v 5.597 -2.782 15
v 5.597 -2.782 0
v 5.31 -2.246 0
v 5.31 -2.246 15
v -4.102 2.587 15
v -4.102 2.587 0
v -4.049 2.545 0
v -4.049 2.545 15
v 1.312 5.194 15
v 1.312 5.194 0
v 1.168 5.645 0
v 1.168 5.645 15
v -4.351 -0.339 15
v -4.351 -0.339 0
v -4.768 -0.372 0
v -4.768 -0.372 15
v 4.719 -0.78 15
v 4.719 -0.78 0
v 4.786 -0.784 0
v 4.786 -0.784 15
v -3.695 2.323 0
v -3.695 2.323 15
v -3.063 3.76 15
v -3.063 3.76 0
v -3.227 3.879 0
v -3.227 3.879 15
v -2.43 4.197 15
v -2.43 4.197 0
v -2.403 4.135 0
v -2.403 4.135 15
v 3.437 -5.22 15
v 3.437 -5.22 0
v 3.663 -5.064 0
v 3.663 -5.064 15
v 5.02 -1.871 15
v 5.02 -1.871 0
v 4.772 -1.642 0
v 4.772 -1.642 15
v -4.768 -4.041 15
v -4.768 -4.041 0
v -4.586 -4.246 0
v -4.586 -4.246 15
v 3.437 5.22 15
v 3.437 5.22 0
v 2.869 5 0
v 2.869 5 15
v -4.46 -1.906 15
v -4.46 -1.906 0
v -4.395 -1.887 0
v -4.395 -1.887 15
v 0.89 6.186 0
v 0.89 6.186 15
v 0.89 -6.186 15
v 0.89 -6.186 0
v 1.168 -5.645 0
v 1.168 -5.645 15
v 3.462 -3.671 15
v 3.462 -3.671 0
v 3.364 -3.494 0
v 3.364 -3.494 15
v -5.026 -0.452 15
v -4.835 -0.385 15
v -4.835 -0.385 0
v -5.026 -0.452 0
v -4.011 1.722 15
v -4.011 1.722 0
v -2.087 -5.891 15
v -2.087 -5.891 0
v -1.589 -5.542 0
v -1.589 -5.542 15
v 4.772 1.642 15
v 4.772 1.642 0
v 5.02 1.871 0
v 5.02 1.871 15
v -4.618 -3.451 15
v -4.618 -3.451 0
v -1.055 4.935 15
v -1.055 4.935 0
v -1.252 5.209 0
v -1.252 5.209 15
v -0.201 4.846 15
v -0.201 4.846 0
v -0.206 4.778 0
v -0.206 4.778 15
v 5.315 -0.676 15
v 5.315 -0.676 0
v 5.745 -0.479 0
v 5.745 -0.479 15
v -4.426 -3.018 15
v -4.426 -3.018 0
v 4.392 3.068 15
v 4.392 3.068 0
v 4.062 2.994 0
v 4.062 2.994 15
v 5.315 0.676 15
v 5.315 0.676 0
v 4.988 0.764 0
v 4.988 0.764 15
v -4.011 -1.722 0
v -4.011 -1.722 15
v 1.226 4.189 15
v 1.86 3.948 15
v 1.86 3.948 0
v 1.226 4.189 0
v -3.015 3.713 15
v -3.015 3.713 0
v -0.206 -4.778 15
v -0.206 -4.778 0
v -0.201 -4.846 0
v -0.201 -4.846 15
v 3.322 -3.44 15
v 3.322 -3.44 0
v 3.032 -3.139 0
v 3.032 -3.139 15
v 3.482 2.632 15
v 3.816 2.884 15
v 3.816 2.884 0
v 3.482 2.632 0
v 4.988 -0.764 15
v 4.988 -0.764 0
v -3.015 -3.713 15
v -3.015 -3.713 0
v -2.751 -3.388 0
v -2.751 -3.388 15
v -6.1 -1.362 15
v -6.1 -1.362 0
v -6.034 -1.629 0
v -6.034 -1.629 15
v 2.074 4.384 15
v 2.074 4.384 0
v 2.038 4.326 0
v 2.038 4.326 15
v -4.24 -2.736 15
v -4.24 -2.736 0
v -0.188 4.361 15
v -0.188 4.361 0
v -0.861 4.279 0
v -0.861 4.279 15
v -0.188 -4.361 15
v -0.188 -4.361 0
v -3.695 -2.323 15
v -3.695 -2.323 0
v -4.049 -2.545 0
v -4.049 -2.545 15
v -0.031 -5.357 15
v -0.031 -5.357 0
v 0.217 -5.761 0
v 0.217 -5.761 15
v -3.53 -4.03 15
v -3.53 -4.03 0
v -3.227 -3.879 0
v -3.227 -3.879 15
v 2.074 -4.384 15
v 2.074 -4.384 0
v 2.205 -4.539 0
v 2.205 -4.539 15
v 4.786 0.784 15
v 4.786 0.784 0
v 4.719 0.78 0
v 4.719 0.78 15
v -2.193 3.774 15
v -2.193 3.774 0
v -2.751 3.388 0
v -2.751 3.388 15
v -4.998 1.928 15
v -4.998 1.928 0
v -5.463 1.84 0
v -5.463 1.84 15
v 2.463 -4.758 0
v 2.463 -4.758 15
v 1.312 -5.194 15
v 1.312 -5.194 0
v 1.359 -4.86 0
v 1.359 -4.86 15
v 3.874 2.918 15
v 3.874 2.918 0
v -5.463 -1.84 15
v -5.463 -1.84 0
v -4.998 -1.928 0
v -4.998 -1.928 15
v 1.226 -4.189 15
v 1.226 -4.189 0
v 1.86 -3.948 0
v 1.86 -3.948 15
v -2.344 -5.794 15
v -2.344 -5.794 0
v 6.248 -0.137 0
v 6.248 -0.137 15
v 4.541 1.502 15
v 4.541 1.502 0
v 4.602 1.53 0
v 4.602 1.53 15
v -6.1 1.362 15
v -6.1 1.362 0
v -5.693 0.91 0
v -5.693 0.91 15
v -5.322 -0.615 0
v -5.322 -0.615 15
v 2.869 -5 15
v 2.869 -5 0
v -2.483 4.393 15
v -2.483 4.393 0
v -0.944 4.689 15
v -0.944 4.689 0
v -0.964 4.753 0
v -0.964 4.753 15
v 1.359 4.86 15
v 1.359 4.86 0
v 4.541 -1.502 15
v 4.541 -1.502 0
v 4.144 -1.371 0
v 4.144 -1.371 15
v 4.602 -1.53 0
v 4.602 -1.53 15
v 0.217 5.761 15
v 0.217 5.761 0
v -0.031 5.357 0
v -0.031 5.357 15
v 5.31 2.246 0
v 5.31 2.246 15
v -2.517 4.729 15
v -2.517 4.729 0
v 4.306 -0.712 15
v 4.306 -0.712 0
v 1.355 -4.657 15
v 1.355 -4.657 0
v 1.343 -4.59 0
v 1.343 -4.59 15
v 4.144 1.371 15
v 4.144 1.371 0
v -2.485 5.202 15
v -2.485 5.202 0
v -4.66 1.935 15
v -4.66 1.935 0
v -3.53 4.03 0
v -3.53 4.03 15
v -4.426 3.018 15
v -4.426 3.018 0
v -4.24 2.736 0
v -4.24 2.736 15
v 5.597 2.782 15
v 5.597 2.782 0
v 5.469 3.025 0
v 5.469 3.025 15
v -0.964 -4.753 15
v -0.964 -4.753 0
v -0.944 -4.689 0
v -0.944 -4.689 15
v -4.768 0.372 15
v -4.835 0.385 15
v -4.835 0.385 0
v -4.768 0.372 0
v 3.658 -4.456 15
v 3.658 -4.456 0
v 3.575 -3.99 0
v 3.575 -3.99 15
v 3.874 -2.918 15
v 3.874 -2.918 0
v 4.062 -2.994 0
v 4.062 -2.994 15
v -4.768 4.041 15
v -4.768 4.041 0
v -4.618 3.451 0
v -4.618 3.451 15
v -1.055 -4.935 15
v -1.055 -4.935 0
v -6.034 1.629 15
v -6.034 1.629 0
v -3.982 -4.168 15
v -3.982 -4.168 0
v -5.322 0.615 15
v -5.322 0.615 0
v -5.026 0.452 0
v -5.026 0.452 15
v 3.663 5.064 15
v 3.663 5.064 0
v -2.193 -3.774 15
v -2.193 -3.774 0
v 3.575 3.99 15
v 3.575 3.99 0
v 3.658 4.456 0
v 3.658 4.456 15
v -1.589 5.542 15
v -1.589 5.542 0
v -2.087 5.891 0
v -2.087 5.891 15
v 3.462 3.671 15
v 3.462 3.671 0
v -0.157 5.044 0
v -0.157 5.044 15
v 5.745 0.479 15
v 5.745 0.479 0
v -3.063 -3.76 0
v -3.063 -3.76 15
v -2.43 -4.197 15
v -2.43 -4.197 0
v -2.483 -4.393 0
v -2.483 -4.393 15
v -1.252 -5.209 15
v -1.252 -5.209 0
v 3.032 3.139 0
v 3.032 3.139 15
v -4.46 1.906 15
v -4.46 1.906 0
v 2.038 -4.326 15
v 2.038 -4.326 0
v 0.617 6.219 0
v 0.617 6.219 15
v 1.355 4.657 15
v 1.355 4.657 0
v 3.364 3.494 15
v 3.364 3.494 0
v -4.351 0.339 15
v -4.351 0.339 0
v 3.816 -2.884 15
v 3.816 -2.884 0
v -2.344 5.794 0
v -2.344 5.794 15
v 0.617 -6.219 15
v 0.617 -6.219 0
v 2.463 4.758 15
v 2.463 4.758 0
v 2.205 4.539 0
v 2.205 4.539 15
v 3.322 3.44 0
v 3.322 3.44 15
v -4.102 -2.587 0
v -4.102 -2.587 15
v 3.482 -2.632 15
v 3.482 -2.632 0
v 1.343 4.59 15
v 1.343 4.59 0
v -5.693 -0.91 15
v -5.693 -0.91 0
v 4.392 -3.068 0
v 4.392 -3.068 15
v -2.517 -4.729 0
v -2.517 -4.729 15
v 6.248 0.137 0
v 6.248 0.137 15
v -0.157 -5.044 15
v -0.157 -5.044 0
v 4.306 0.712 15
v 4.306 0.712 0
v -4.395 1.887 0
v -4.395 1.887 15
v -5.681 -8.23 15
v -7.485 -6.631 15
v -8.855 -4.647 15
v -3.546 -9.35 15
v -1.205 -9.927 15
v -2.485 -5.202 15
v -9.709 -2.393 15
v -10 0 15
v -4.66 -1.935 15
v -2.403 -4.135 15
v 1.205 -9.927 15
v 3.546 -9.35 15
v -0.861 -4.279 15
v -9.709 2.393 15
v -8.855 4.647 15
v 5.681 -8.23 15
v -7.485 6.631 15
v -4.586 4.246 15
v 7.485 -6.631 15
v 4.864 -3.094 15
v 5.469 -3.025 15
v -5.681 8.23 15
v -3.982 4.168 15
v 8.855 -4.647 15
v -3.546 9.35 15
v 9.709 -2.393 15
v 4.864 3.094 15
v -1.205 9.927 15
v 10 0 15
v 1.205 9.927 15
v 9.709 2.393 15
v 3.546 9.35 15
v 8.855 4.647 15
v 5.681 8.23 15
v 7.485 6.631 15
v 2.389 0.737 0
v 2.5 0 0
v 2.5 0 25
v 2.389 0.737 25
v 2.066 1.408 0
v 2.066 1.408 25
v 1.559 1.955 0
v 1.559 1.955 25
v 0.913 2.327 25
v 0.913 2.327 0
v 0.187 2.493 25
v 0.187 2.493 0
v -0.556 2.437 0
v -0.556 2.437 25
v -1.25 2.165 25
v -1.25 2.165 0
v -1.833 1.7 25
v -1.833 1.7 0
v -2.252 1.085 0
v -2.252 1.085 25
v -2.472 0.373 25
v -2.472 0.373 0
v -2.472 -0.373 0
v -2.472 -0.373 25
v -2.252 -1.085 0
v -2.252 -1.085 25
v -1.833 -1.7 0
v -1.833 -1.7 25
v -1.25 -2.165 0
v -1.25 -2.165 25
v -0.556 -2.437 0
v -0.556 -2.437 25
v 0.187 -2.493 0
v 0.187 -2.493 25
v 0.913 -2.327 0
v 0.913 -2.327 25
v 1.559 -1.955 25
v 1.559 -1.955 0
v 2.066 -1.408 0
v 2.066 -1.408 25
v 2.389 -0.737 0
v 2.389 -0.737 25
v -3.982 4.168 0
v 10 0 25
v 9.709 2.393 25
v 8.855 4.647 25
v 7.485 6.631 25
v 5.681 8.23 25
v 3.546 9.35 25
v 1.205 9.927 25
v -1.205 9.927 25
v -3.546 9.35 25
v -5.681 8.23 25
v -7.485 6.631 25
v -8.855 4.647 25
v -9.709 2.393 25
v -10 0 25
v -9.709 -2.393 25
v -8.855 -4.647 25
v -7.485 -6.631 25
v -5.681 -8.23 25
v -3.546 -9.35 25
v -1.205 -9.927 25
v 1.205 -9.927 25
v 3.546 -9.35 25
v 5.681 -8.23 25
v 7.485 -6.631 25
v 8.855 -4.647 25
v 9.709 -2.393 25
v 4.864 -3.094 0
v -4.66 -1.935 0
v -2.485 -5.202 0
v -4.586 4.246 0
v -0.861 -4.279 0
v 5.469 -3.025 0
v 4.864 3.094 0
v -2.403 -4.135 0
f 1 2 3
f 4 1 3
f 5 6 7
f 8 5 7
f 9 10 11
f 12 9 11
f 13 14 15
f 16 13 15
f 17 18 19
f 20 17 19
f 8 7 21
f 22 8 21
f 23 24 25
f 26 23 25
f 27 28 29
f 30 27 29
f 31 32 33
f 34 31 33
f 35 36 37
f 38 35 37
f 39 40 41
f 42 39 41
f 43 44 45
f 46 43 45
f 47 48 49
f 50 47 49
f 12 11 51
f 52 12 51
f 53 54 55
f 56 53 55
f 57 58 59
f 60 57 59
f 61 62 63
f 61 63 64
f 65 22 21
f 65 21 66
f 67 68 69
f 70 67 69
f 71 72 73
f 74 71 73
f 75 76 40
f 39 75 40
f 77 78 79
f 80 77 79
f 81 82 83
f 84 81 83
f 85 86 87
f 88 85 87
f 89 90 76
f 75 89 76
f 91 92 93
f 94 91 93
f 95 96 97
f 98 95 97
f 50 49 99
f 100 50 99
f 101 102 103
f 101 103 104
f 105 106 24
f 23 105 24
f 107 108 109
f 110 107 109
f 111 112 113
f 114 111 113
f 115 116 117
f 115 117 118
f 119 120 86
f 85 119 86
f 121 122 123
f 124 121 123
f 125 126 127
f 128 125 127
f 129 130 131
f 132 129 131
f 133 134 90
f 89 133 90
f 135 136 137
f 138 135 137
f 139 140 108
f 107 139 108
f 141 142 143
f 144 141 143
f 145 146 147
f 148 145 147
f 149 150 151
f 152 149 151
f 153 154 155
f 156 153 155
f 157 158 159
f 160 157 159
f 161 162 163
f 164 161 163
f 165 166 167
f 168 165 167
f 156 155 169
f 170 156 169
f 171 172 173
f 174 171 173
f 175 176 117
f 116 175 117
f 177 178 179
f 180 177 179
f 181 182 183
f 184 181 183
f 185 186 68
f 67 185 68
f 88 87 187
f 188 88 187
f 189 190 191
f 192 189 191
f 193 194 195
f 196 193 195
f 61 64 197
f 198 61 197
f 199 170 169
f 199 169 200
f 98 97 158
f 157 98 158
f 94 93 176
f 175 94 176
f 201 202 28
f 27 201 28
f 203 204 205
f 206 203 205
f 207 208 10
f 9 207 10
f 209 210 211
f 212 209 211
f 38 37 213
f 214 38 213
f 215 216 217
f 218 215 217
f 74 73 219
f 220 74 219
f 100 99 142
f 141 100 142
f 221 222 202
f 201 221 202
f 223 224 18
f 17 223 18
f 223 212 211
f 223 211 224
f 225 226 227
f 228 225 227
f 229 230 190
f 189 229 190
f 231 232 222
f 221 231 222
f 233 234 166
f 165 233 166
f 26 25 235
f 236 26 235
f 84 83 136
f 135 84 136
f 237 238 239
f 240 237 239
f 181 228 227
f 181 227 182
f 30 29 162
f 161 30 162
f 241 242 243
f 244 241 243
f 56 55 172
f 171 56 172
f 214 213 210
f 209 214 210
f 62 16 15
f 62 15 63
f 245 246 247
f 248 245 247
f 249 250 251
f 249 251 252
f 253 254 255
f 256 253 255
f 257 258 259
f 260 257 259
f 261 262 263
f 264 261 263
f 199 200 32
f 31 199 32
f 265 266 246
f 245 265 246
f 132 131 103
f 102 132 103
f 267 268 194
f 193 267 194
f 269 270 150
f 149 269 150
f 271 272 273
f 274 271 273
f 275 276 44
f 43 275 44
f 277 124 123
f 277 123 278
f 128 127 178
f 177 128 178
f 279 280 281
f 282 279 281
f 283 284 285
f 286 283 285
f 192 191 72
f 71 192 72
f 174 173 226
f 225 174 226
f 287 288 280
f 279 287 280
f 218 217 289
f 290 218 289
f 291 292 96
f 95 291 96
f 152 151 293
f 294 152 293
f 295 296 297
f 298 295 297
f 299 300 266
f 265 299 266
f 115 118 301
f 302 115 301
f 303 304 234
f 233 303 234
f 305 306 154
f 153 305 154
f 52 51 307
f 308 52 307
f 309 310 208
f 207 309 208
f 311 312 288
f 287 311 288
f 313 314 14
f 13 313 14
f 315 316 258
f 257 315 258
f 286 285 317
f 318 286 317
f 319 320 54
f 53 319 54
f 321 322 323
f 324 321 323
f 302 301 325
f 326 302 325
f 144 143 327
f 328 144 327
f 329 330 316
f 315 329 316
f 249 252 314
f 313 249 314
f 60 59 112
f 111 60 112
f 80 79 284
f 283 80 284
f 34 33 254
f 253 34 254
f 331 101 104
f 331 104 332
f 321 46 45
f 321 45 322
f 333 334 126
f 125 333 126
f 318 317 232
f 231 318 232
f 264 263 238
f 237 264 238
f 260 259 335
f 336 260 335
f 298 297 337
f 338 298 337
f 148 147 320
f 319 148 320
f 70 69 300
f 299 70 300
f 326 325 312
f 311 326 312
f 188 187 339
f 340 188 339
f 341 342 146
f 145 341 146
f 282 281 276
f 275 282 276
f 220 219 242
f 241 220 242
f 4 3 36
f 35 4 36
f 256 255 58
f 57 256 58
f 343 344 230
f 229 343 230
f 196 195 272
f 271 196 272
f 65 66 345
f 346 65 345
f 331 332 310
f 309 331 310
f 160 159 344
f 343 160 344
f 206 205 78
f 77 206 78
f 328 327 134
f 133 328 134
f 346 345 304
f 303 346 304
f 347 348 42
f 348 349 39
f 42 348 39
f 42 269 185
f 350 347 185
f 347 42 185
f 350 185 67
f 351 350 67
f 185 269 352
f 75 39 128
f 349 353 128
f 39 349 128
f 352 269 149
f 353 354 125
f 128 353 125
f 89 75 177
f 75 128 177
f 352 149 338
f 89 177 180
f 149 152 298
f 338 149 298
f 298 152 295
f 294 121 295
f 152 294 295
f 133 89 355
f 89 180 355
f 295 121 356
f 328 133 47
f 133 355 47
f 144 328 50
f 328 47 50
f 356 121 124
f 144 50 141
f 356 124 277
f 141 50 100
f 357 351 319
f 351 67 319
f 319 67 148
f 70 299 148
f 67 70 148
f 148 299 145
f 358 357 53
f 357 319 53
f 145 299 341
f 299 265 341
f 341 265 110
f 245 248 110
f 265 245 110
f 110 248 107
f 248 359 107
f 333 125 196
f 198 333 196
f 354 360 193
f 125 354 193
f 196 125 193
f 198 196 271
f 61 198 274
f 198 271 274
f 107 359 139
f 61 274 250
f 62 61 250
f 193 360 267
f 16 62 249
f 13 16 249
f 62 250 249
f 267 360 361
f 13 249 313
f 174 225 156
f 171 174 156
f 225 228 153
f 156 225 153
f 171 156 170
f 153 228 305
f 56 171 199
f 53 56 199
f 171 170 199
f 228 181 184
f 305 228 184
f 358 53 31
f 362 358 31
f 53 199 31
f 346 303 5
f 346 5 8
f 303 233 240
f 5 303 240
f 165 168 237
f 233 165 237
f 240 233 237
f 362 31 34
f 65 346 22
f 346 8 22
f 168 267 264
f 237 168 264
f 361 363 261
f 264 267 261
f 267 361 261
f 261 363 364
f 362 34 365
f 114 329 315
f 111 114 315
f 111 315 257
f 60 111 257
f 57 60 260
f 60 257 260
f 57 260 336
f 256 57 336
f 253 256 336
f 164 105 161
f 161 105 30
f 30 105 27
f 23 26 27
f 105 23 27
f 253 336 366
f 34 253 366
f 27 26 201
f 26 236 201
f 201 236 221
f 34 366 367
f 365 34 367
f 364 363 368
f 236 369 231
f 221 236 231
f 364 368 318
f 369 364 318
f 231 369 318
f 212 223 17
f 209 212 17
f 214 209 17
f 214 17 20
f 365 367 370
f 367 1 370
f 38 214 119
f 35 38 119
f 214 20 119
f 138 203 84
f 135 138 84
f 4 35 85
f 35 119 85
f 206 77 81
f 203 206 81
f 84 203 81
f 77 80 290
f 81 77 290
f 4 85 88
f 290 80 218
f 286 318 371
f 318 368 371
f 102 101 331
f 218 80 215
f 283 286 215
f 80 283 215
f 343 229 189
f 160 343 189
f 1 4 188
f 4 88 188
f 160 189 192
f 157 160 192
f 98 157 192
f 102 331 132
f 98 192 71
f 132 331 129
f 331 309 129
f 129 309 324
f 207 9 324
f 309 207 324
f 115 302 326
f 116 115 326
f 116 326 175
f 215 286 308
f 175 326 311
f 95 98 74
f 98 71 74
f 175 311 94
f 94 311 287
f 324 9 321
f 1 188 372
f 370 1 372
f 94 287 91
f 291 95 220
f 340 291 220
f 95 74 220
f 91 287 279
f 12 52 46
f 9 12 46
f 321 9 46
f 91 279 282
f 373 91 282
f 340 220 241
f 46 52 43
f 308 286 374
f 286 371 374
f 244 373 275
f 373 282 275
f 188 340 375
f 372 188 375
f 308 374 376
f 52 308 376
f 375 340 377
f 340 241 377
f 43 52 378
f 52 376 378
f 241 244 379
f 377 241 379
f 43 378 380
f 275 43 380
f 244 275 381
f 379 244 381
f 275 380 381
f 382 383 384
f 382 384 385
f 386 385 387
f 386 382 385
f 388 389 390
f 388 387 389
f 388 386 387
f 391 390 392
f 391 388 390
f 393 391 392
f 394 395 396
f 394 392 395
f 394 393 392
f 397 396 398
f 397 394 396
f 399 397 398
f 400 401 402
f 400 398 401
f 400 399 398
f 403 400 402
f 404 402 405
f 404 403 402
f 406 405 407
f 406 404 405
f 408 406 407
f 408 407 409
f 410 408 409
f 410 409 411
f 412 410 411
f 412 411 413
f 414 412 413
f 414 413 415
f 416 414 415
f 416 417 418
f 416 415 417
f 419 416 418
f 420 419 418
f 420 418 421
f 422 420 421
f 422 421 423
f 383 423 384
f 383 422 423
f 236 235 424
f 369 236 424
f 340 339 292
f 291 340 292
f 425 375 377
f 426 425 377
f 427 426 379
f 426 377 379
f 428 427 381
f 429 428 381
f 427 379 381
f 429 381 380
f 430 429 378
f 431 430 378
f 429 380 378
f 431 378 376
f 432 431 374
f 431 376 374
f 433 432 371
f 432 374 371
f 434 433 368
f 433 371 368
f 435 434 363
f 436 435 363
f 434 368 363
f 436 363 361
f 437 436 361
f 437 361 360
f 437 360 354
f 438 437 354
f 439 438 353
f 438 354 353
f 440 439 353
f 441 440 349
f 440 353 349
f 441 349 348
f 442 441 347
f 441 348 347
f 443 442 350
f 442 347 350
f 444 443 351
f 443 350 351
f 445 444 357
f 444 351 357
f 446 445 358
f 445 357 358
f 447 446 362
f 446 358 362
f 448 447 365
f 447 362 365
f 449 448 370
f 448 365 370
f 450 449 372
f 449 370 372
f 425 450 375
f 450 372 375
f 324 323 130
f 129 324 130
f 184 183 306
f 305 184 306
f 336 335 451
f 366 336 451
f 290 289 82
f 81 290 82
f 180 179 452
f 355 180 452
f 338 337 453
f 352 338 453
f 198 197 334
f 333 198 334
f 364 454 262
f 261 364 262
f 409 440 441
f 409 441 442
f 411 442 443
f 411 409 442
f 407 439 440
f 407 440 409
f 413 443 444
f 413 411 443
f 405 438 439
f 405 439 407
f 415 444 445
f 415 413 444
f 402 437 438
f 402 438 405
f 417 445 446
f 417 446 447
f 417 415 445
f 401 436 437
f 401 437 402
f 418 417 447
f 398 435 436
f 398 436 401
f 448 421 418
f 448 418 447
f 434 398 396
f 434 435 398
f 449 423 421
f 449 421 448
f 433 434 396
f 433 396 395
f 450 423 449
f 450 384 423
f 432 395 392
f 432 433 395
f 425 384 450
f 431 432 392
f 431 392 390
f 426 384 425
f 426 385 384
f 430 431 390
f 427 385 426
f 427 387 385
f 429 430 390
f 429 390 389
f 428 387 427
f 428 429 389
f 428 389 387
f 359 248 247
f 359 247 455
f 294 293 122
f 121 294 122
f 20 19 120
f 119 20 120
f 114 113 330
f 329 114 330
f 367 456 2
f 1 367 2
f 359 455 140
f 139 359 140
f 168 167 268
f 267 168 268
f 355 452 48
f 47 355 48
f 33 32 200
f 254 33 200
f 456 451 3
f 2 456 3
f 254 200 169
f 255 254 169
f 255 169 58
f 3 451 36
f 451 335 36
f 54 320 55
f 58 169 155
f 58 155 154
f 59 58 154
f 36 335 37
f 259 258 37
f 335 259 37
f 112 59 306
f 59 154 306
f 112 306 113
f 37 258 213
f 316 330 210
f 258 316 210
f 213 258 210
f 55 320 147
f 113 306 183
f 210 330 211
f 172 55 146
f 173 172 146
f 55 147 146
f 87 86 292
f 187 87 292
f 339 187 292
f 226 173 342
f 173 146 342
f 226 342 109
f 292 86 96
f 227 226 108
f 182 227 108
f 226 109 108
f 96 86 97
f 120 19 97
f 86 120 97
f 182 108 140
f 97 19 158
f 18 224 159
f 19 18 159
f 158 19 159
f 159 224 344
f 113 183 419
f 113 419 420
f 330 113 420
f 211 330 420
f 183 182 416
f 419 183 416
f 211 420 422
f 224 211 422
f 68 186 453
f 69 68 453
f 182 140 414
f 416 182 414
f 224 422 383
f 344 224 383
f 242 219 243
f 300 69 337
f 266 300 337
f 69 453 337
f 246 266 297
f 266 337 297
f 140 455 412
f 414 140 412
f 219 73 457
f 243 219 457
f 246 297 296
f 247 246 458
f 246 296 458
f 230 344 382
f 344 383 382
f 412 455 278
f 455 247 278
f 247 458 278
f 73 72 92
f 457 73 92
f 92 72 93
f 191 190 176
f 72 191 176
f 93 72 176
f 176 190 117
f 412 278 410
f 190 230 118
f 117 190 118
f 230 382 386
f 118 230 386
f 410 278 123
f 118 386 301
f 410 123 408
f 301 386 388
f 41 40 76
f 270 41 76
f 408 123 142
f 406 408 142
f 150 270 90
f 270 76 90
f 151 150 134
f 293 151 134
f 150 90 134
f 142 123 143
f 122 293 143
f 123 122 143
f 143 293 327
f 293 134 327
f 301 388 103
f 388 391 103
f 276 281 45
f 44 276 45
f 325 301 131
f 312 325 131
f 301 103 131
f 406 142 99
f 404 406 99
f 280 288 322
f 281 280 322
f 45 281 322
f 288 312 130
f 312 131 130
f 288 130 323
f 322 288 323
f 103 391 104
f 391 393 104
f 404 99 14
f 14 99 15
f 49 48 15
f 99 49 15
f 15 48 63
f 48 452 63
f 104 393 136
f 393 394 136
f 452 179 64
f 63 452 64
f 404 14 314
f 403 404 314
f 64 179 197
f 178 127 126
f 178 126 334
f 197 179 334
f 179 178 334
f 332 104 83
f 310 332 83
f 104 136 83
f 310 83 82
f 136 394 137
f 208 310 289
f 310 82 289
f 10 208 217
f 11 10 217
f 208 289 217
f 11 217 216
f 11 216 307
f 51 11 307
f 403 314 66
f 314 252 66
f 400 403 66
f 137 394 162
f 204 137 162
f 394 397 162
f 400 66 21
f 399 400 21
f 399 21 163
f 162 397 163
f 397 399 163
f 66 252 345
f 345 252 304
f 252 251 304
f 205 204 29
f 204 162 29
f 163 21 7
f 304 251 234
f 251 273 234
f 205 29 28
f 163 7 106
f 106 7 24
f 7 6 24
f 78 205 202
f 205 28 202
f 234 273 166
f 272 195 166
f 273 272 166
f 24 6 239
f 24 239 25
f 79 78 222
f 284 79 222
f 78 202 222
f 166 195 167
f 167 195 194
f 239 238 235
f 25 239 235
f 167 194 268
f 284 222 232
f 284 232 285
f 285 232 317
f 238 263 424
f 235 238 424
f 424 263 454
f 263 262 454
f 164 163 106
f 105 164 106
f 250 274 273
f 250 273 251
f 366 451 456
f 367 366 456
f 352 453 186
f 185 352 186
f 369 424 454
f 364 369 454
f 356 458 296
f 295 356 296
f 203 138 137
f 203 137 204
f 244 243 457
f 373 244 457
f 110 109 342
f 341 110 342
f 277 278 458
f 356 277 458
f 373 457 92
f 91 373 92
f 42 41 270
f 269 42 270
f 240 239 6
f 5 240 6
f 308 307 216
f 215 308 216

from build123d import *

# Parameters (mm, degrees)
CYLINDER005_R          = 2.5
CYLINDER005_DEPTH      = 27
CYLINDER004_R          = 10
CYLINDER004_DEPTH      = 10
LINEAREXTRUDE003_DEPTH = 15


with BuildPart() as cylinder005:
    # cylinder005 → cylinder005 (new body)
    with BuildSketch(Plane.XY.offset(-1)):
        Circle(CYLINDER005_R)
    extrude(amount=CYLINDER005_DEPTH)


with BuildPart() as cylinder004:
    # cylinder004 → cylinder004 (new body)
    with BuildSketch(Plane.XY.offset(15)):
        Circle(CYLINDER004_R)
    extrude(amount=CYLINDER004_DEPTH)


with BuildPart() as pinion:
    # union004 → LinearExtrude003 (new body)
    with BuildSketch(Plane(origin=(0, 0, 0), x_dir=(0, 1, 0), z_dir=(0, 0, 1))):
        Polygon((0.711931, -4.306123), (1.370771, -4.143733), (1.502069, -4.540636), (1.530367, -4.602072), (1.641751, -4.771632), (1.871155, -5.020002), (2.245545, -5.309618), (2.782207, -5.596589), (3.025427, -5.468937), (3.094113, -4.864255), (3.068442, -4.391617), (2.994354, -4.061731), (2.918082, -3.873743), (2.883597, -3.815555), (2.631538, -3.482032), (3.139447, -3.032064), (3.440155, -3.322487), (3.493763, -3.363735), (3.671187, -3.46211), (3.989737, -3.575421), (4.455834, -3.657875), (5.064387, -3.662577), (5.220426, -3.436516), (5.000234, -2.869177), (4.757857, -2.462607), (4.53895, -2.204938), (4.384052, -2.073928), (4.326475, -2.038431), (3.948292, -1.860249), (4.188912, -1.225786), (4.590143, -1.343197), (4.656779, -1.354807), (4.859597, -1.359461), (5.194318, -1.311756), (5.645345, -1.168159), (6.186377, -0.889514), (6.219486, -0.616832), (5.76086, -0.216806), (5.357304, 0.030555), (5.043726, 0.156979), (4.845688, 0.200998), (4.77821, 0.205671), (4.36054, 0.187693), (4.278749, 0.861305), (4.688584, 0.943805), (4.752983, 0.964491), (4.934732, 1.054624), (5.208943, 1.252418), (5.541575, 1.58917), (5.891142, 2.087328), (5.793738, 2.344162), (5.201743, 2.485233), (4.729457, 2.516719), (4.393046, 2.482935), (4.197235, 2.429879), (4.135314, 2.402658), (3.773841, 2.192639), (3.388376, 2.751081), (3.712928, 3.01459), (3.760337, 3.062835), (3.879381, 3.227107), (4.030263, 3.529677), (4.168298, 3.982437), (4.246318, 4.585986), (4.040715, 4.768136), (3.45097, 4.617935), (3.018149, 4.426332), (2.735972, 4.240079), (2.587247, 4.102103), (2.545069, 4.049224), (2.322601, 3.695276), (1.721767, 4.010618), (1.886685, 4.394771), (1.906243, 4.459522), (1.93531, 4.6603), (1.928298, 4.99833), (1.840114, 5.463378), (1.628715, 6.034052), (1.362012, 6.099788), (0.909622, 5.692724), (0.61542, 5.321926), (0.452121, 5.025874), (0.384552, 4.834585), (0.371779, 4.768162), (0.339281, 4.351371), (-0.339281, 4.351371), (-0.371779, 4.768162), (-0.384552, 4.834585), (-0.452121, 5.025874), (-0.61542, 5.321926), (-0.909622, 5.692724), (-1.362012, 6.099788), (-1.628715, 6.034052), (-1.840114, 5.463378), (-1.928298, 4.99833), (-1.93531, 4.6603), (-1.906243, 4.459522), (-1.886685, 4.394771), (-1.721767, 4.010618), (-2.322601, 3.695276), (-2.545069, 4.049224), (-2.587247, 4.102103), (-2.735972, 4.240079), (-3.018149, 4.426332), (-3.45097, 4.617935), (-4.040715, 4.768136), (-4.246318, 4.585986), (-4.168298, 3.982437), (-4.030263, 3.529677), (-3.879381, 3.227107), (-3.760337, 3.062835), (-3.712928, 3.01459), (-3.388376, 2.751081), (-3.773841, 2.192638), (-4.135314, 2.402658), (-4.197235, 2.429879), (-4.393046, 2.482935), (-4.729457, 2.516719), (-5.201743, 2.485233), (-5.793738, 2.344162), (-5.891142, 2.087328), (-5.541575, 1.58917), (-5.208943, 1.252418), (-4.934732, 1.054624), (-4.752983, 0.964491), (-4.688584, 0.943805), (-4.278749, 0.861305), (-4.36054, 0.187693), (-4.77821, 0.205671), (-4.845688, 0.200998), (-5.043726, 0.156979), (-5.357304, 0.030555), (-5.76086, -0.216806), (-6.219486, -0.616832), (-6.186377, -0.889514), (-5.645345, -1.168159), (-5.194318, -1.311756), (-4.859597, -1.359461), (-4.656779, -1.354807), (-4.590143, -1.343197), (-4.188912, -1.225786), (-3.948292, -1.860249), (-4.326475, -2.038431), (-4.384052, -2.073928), (-4.53895, -2.204938), (-4.757857, -2.462607), (-5.000234, -2.869177), (-5.220426, -3.436516), (-5.064387, -3.662577), (-4.455834, -3.657875), (-3.989737, -3.575421), (-3.671187, -3.46211), (-3.493763, -3.363735), (-3.440155, -3.322487), (-3.139447, -3.032064), (-2.631537, -3.482032), (-2.883597, -3.815555), (-2.918082, -3.873743), (-2.994354, -4.061731), (-3.068442, -4.391617), (-3.094113, -4.864255), (-3.025427, -5.468937), (-2.782207, -5.596589), (-2.245545, -5.309618), (-1.871155, -5.020002), (-1.641751, -4.771632), (-1.530367, -4.602072), (-1.502069, -4.540636), (-1.370771, -4.143733), (-0.71193, -4.306122), (-0.780122, -4.71858), (-0.783616, -4.78613), (-0.763789, -4.98803), (-0.676085, -5.31456), (-0.47917, -5.74499), (-0.137342, -6.24849), (0.137342, -6.24849), (0.47917, -5.74499), (0.676085, -5.31456), (0.763789, -4.98803), (0.783616, -4.78613), (0.780122, -4.71858), align=None)
    extrude(amount=LINEAREXTRUDE003_DEPTH)

    # union005: union cylinder004
    add(cylinder004.part)

    # difference004: cut cylinder005
    add(cylinder005.part, mode=Mode.SUBTRACT)


solid = pinion.part
